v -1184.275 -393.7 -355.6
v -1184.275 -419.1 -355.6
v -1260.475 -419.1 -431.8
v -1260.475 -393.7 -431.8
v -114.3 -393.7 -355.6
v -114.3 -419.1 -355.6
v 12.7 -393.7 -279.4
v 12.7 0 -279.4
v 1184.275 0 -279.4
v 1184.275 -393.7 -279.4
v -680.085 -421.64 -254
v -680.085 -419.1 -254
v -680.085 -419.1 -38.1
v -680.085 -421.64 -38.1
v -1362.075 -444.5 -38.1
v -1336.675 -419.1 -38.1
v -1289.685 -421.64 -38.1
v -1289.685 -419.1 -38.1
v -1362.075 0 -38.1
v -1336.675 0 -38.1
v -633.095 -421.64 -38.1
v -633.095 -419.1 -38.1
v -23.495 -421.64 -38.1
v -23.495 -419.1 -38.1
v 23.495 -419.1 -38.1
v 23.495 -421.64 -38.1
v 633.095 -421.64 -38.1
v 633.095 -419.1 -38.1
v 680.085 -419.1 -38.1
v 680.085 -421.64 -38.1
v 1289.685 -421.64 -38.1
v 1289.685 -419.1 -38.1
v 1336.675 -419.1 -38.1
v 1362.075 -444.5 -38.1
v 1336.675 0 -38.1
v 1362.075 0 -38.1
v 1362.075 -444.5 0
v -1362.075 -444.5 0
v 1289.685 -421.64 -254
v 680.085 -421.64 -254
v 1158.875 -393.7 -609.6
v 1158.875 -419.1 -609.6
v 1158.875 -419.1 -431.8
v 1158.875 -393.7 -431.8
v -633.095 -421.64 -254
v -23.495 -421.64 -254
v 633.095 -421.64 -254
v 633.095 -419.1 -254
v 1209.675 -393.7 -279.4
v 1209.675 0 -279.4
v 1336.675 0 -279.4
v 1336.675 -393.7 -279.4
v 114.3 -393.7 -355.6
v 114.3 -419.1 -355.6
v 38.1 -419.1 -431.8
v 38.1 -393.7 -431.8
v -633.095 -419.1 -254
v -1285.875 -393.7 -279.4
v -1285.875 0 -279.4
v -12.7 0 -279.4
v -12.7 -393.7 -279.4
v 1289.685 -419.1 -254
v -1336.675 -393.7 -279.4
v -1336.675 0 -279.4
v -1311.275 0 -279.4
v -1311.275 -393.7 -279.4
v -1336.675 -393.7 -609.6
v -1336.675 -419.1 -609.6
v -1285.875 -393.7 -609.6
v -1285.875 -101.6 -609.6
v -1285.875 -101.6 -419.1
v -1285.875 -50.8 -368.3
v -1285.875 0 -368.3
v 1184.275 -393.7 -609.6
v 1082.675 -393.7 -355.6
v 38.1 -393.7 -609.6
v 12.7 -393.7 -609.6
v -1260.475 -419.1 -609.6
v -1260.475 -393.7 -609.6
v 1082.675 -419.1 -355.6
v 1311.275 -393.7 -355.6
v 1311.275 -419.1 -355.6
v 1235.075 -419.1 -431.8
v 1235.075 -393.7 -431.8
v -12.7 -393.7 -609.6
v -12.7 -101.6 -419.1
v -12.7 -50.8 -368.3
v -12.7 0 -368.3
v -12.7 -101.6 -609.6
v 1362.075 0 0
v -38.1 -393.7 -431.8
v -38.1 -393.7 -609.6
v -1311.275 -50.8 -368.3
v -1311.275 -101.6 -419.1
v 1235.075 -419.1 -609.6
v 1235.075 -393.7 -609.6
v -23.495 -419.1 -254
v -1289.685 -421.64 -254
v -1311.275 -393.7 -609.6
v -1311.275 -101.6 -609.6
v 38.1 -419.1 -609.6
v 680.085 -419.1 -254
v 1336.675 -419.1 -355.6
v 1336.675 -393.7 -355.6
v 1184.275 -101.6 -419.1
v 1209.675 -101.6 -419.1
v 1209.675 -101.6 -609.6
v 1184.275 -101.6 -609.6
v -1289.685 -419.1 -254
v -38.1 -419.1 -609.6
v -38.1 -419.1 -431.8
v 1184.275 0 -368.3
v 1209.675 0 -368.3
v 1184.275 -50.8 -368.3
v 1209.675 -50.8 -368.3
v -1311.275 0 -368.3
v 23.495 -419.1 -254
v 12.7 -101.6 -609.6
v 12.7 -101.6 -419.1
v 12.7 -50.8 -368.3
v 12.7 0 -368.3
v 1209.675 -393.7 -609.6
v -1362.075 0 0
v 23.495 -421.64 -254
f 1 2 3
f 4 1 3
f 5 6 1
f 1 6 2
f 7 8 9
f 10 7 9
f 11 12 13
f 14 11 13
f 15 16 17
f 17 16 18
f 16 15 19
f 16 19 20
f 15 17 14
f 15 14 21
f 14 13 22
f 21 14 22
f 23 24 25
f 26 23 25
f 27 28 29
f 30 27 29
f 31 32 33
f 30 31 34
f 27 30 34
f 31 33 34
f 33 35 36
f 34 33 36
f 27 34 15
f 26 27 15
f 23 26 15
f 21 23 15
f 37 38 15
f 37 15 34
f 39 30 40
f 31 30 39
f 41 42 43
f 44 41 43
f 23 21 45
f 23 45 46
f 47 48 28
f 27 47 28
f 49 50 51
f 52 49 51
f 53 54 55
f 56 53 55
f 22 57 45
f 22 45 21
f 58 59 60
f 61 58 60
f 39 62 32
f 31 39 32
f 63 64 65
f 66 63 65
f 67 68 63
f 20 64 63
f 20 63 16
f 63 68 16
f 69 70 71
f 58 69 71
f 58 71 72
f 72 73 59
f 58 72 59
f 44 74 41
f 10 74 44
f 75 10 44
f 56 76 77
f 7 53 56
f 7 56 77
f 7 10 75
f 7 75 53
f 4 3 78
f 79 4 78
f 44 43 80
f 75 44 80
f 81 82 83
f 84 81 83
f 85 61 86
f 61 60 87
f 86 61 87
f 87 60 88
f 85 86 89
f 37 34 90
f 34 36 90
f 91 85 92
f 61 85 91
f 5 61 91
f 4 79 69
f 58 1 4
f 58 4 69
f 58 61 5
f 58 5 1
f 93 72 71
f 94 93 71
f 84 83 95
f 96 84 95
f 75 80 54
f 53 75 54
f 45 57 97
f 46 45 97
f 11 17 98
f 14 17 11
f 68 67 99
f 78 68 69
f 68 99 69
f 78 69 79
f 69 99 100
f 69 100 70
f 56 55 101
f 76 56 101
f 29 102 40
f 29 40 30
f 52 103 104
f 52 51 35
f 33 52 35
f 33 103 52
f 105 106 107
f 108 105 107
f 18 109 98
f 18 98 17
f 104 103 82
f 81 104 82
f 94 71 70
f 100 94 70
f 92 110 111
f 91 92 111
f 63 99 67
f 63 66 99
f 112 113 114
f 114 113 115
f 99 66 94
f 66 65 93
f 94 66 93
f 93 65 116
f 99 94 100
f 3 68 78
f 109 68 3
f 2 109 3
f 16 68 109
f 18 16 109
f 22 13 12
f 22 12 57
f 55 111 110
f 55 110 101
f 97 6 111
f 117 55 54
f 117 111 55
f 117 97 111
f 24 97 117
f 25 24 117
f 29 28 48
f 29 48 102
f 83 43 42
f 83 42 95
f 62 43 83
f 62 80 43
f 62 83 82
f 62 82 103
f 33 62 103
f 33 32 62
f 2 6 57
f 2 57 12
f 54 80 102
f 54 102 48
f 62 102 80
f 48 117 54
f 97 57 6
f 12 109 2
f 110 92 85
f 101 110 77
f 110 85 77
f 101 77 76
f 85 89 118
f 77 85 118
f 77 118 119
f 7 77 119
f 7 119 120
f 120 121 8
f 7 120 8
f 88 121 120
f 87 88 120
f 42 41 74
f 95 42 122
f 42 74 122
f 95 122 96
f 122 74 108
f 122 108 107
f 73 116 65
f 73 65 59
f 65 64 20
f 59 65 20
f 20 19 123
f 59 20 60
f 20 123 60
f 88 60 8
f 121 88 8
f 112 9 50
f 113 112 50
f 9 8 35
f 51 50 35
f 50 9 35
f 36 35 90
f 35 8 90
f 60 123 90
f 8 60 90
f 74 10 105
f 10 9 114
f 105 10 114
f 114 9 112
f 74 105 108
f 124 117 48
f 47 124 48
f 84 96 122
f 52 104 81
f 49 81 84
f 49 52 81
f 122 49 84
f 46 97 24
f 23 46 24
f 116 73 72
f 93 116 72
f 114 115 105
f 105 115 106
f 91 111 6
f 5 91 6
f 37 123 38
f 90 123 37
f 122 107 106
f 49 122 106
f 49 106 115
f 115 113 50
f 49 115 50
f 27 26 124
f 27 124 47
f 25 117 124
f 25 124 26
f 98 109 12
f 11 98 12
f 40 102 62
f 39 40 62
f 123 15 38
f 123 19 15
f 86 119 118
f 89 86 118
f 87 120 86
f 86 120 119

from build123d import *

# Parameters (mm, degrees)
F0_W          = 2724.15
F0_H          = 419.1
F1_DEPTH      = 609.6
F3_DEPTH      = 1362.076
F3_DEPTH_BACK = 1362.076
F4_W          = 25.4
F4_H          = 571.5
F5_DEPTH      = 419.101
F7_DEPTH      = 419.101
F8_W          = 609.6
F8_H          = 215.9
F9_DEPTH      = 2.54
F11_DEPTH     = 393.7
F12_W         = 2724.15
F12_H         = 38.1
F13_DEPTH     = 25.4


with BuildPart() as f1:
    # F0 (on Top) → F1 (new body)
    with BuildSketch(Plane.XY):
        with Locations((0, -209.55)):
            Rectangle(F0_W, F0_H)
    extrude(amount=-F1_DEPTH)

    # F2 (on Right) → F3 (cut, two sides)
    with BuildSketch(Plane.YZ) as f3_sk:
        Polygon((-101.6, -419.1), (-101.6, -609.6), (0, -609.6), (0, -368.3), (-50.8, -368.3), align=None)
    extrude(amount=F3_DEPTH, mode=Mode.SUBTRACT)
    extrude(f3_sk.sketch, amount=-F3_DEPTH_BACK, mode=Mode.SUBTRACT)

    # F4 (on face) → F5 (cut, through all)
    with BuildSketch(Plane.XZ.offset(419.1)):
        with Locations((1349.375, -323.85)):
            Rectangle(F4_W, F4_H)
        with Locations((-1349.375, -323.85)):
            Rectangle(F4_W, F4_H)
    extrude(amount=-F5_DEPTH, mode=Mode.SUBTRACT)

    # F6 (on face) → F7 (cut, through all)
    with BuildSketch(Plane.XZ.offset(419.1)):
        Polygon((-1260.475, -431.8), (-1260.475, -609.6), (-38.1, -609.6), (-38.1, -431.8), (-114.3, -355.6), (-1184.275, -355.6), align=None)
        Polygon((38.1, -431.8), (38.1, -609.6), (1158.875, -609.6), (1158.875, -431.8), (1082.675, -355.6), (114.3, -355.6), align=None)
        Polygon((1235.075, -431.8), (1235.075, -609.6), (1336.675, -609.6), (1336.675, -355.6), (1311.275, -355.6), align=None)
    extrude(amount=-F7_DEPTH, mode=Mode.SUBTRACT)

    # F8 (on face) → F9 (join)
    with BuildSketch(Plane.XZ.offset(419.1)):
        with Locations((-984.885, -146.05)):
            Rectangle(F8_W, F8_H)
        with Locations((-328.295, -146.05)):
            Rectangle(F8_W, F8_H)
        with Locations((328.295, -146.05)):
            Rectangle(F8_W, F8_H)
        with Locations((984.885, -146.05)):
            Rectangle(F8_W, F8_H)
    extrude(amount=F9_DEPTH)

    # F10 (on face) → F11 (cut, through all)
    with BuildSketch(Plane(origin=(0, 0, 0), x_dir=(-1, 0, 0), z_dir=(0, 1, 0))):
        Polygon((-1184.275, -609.6), (-1209.675, -609.6), (-1209.675, -279.4), (-1336.675, -279.4), (-1336.675, -635), (1336.675, -635), (1336.675, -279.4), (1311.275, -279.4), (1311.275, -609.6), (1285.875, -609.6), (1285.875, -279.4), (12.7, -279.4), (12.7, -609.6), (-12.7, -609.6), (-12.7, -279.4), (-1184.275, -279.4), align=None)
    extrude(amount=-F11_DEPTH, mode=Mode.SUBTRACT)

    # F12 (on face) → F13 (join)
    with BuildSketch(Plane.XZ.offset(419.1)):
        with Locations((0, -19.05)):
            Rectangle(F12_W, F12_H)
    extrude(amount=F13_DEPTH)


solid = f1.part
